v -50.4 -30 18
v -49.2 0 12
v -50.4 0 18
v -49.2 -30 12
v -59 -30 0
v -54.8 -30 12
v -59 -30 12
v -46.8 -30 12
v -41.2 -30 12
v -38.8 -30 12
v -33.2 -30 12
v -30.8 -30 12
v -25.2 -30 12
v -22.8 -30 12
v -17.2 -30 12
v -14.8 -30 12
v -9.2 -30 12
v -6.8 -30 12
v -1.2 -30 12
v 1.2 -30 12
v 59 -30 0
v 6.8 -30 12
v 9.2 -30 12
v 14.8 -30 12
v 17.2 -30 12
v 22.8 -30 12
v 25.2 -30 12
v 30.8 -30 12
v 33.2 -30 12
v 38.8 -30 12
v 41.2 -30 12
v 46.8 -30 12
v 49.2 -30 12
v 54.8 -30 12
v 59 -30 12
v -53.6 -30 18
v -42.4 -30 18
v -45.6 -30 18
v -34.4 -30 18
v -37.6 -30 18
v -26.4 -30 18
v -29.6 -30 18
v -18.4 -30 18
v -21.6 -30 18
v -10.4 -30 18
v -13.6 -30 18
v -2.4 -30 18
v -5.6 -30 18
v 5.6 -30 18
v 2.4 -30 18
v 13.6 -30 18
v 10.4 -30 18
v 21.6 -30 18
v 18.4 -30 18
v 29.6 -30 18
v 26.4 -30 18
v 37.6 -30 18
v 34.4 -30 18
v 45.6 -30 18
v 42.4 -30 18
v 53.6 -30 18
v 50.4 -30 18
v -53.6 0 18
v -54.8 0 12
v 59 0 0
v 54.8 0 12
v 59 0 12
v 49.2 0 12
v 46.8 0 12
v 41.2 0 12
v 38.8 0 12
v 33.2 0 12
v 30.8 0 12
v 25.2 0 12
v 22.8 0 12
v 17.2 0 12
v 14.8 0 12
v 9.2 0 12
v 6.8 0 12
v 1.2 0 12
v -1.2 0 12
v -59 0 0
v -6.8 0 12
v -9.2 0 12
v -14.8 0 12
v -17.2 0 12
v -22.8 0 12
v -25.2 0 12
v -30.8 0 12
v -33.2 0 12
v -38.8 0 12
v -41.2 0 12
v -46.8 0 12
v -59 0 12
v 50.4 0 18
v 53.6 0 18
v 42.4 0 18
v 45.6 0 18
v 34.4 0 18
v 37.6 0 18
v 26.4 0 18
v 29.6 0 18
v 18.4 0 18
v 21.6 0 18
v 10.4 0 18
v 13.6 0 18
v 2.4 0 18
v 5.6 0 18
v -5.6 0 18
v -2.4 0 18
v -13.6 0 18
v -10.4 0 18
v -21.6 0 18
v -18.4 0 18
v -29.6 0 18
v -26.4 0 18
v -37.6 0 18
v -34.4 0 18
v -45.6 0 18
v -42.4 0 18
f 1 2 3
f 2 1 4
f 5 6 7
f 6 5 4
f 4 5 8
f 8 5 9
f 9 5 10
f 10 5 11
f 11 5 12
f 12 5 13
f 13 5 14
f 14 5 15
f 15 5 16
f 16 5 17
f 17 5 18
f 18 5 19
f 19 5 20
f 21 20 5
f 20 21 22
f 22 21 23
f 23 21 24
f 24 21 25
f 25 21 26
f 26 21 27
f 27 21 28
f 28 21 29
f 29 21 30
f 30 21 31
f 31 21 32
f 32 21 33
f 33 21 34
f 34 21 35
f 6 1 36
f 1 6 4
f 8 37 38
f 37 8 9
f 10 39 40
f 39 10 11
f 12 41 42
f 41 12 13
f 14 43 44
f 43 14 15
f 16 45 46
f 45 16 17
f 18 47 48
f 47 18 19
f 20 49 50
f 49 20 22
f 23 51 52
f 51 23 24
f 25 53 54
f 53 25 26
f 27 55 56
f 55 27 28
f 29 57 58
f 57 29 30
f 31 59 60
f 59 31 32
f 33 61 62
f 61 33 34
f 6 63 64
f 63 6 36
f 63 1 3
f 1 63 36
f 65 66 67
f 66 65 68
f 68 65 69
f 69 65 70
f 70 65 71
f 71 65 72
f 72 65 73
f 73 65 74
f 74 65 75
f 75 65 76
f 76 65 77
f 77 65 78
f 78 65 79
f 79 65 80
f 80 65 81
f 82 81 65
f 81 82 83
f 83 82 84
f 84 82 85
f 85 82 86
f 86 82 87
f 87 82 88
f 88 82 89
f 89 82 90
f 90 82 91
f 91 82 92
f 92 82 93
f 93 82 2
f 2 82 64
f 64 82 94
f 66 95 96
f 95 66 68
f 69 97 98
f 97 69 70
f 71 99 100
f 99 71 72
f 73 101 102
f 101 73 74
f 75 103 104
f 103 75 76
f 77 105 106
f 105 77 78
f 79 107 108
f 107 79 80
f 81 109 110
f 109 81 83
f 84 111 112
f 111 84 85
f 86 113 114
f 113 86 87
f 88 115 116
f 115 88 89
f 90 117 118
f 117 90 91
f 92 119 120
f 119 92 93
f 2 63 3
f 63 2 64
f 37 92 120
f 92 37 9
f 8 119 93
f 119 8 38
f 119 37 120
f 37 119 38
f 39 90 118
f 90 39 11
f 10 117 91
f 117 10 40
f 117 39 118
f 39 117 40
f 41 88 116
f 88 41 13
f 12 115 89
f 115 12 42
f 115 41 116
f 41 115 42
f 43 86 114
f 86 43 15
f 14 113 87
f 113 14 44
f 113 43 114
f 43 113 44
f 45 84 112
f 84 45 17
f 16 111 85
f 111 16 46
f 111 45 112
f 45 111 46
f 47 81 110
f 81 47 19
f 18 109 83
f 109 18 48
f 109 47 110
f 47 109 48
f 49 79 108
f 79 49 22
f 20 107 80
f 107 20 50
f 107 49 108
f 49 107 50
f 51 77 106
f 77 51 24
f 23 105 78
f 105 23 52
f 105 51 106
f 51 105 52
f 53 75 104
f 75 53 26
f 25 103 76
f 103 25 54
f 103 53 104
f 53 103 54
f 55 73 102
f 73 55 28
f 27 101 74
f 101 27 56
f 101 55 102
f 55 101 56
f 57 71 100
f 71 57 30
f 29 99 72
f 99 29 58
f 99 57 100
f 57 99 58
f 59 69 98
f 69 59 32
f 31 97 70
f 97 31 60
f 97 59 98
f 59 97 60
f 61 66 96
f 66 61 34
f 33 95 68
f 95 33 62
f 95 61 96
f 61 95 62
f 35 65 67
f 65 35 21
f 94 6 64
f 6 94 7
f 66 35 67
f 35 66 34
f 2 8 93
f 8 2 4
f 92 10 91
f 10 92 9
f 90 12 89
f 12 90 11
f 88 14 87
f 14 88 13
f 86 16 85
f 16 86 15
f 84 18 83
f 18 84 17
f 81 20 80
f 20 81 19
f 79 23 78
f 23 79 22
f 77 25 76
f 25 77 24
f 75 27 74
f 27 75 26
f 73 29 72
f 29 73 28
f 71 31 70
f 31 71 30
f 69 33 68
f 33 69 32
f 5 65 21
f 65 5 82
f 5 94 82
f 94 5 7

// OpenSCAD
$fn = 32;

// ----------------------------------------------------------------------
// Toothed rack, 14 teeth
// 8 mm pitch, 6 mm teeth
// ----------------------------------------------------------------------

// --- parameters (mm) ---
bar_w = 30;     // bar width (Y)
bar_h = 12;     // bar height (Z)
teeth = 14;     // number of teeth
pitch = 8;      // tooth pitch
tooth_h = 6;    // tooth height above the bar
root_w = 6;     // tooth width at the root
crest_w = 3.2;  // tooth width at the crest

// --- derived feature positions (mm) ---
span = (teeth - 1) * pitch;  // = 104   distance between the outer teeth
bar_l = span + root_w + 8;   // = 118   bar length: teeth plus 4 mm at each end
tooth_x = -span / 2;         // = -52   X of the first tooth
height = bar_h + tooth_h;    // = 18   overall height
feature_centers = [
  [tooth_x + 0 * pitch, -bar_w / 2],
  [tooth_x + 1 * pitch, -bar_w / 2],
  [tooth_x + 2 * pitch, -bar_w / 2],
  [tooth_x + 3 * pitch, -bar_w / 2],
  [tooth_x + 4 * pitch, -bar_w / 2],
  [tooth_x + 5 * pitch, -bar_w / 2],
  [tooth_x + 6 * pitch, -bar_w / 2],
  [tooth_x + 7 * pitch, -bar_w / 2],
  [tooth_x + 8 * pitch, -bar_w / 2],
  [tooth_x + 9 * pitch, -bar_w / 2],
  [tooth_x + 10 * pitch, -bar_w / 2],
  [tooth_x + 11 * pitch, -bar_w / 2],
  [tooth_x + 12 * pitch, -bar_w / 2],
  [tooth_x + 13 * pitch, -bar_w / 2]
];   // tooth centre line, drives the tooth loop

// bar with a rack of teeth, one extruded trapezoium per centre
module rack_tooth() {
  linear_extrude(height = bar_w)
    polygon(points = [
      [0, 0],
      [root_w, 0],
      [root_w / 2 + crest_w / 2, tooth_h + 1],
      [root_w / 2 - crest_w / 2, tooth_h + 1]
    ]);
}

union() {
  translate([-bar_l / 2, -bar_w, 0]) cube([bar_l, bar_w, bar_h]);
  for (centre = feature_centers)
    translate([centre[0] - root_w / 2, 0, bar_h - 1]) rotate([90, 0, 0]) rack_tooth();
}
